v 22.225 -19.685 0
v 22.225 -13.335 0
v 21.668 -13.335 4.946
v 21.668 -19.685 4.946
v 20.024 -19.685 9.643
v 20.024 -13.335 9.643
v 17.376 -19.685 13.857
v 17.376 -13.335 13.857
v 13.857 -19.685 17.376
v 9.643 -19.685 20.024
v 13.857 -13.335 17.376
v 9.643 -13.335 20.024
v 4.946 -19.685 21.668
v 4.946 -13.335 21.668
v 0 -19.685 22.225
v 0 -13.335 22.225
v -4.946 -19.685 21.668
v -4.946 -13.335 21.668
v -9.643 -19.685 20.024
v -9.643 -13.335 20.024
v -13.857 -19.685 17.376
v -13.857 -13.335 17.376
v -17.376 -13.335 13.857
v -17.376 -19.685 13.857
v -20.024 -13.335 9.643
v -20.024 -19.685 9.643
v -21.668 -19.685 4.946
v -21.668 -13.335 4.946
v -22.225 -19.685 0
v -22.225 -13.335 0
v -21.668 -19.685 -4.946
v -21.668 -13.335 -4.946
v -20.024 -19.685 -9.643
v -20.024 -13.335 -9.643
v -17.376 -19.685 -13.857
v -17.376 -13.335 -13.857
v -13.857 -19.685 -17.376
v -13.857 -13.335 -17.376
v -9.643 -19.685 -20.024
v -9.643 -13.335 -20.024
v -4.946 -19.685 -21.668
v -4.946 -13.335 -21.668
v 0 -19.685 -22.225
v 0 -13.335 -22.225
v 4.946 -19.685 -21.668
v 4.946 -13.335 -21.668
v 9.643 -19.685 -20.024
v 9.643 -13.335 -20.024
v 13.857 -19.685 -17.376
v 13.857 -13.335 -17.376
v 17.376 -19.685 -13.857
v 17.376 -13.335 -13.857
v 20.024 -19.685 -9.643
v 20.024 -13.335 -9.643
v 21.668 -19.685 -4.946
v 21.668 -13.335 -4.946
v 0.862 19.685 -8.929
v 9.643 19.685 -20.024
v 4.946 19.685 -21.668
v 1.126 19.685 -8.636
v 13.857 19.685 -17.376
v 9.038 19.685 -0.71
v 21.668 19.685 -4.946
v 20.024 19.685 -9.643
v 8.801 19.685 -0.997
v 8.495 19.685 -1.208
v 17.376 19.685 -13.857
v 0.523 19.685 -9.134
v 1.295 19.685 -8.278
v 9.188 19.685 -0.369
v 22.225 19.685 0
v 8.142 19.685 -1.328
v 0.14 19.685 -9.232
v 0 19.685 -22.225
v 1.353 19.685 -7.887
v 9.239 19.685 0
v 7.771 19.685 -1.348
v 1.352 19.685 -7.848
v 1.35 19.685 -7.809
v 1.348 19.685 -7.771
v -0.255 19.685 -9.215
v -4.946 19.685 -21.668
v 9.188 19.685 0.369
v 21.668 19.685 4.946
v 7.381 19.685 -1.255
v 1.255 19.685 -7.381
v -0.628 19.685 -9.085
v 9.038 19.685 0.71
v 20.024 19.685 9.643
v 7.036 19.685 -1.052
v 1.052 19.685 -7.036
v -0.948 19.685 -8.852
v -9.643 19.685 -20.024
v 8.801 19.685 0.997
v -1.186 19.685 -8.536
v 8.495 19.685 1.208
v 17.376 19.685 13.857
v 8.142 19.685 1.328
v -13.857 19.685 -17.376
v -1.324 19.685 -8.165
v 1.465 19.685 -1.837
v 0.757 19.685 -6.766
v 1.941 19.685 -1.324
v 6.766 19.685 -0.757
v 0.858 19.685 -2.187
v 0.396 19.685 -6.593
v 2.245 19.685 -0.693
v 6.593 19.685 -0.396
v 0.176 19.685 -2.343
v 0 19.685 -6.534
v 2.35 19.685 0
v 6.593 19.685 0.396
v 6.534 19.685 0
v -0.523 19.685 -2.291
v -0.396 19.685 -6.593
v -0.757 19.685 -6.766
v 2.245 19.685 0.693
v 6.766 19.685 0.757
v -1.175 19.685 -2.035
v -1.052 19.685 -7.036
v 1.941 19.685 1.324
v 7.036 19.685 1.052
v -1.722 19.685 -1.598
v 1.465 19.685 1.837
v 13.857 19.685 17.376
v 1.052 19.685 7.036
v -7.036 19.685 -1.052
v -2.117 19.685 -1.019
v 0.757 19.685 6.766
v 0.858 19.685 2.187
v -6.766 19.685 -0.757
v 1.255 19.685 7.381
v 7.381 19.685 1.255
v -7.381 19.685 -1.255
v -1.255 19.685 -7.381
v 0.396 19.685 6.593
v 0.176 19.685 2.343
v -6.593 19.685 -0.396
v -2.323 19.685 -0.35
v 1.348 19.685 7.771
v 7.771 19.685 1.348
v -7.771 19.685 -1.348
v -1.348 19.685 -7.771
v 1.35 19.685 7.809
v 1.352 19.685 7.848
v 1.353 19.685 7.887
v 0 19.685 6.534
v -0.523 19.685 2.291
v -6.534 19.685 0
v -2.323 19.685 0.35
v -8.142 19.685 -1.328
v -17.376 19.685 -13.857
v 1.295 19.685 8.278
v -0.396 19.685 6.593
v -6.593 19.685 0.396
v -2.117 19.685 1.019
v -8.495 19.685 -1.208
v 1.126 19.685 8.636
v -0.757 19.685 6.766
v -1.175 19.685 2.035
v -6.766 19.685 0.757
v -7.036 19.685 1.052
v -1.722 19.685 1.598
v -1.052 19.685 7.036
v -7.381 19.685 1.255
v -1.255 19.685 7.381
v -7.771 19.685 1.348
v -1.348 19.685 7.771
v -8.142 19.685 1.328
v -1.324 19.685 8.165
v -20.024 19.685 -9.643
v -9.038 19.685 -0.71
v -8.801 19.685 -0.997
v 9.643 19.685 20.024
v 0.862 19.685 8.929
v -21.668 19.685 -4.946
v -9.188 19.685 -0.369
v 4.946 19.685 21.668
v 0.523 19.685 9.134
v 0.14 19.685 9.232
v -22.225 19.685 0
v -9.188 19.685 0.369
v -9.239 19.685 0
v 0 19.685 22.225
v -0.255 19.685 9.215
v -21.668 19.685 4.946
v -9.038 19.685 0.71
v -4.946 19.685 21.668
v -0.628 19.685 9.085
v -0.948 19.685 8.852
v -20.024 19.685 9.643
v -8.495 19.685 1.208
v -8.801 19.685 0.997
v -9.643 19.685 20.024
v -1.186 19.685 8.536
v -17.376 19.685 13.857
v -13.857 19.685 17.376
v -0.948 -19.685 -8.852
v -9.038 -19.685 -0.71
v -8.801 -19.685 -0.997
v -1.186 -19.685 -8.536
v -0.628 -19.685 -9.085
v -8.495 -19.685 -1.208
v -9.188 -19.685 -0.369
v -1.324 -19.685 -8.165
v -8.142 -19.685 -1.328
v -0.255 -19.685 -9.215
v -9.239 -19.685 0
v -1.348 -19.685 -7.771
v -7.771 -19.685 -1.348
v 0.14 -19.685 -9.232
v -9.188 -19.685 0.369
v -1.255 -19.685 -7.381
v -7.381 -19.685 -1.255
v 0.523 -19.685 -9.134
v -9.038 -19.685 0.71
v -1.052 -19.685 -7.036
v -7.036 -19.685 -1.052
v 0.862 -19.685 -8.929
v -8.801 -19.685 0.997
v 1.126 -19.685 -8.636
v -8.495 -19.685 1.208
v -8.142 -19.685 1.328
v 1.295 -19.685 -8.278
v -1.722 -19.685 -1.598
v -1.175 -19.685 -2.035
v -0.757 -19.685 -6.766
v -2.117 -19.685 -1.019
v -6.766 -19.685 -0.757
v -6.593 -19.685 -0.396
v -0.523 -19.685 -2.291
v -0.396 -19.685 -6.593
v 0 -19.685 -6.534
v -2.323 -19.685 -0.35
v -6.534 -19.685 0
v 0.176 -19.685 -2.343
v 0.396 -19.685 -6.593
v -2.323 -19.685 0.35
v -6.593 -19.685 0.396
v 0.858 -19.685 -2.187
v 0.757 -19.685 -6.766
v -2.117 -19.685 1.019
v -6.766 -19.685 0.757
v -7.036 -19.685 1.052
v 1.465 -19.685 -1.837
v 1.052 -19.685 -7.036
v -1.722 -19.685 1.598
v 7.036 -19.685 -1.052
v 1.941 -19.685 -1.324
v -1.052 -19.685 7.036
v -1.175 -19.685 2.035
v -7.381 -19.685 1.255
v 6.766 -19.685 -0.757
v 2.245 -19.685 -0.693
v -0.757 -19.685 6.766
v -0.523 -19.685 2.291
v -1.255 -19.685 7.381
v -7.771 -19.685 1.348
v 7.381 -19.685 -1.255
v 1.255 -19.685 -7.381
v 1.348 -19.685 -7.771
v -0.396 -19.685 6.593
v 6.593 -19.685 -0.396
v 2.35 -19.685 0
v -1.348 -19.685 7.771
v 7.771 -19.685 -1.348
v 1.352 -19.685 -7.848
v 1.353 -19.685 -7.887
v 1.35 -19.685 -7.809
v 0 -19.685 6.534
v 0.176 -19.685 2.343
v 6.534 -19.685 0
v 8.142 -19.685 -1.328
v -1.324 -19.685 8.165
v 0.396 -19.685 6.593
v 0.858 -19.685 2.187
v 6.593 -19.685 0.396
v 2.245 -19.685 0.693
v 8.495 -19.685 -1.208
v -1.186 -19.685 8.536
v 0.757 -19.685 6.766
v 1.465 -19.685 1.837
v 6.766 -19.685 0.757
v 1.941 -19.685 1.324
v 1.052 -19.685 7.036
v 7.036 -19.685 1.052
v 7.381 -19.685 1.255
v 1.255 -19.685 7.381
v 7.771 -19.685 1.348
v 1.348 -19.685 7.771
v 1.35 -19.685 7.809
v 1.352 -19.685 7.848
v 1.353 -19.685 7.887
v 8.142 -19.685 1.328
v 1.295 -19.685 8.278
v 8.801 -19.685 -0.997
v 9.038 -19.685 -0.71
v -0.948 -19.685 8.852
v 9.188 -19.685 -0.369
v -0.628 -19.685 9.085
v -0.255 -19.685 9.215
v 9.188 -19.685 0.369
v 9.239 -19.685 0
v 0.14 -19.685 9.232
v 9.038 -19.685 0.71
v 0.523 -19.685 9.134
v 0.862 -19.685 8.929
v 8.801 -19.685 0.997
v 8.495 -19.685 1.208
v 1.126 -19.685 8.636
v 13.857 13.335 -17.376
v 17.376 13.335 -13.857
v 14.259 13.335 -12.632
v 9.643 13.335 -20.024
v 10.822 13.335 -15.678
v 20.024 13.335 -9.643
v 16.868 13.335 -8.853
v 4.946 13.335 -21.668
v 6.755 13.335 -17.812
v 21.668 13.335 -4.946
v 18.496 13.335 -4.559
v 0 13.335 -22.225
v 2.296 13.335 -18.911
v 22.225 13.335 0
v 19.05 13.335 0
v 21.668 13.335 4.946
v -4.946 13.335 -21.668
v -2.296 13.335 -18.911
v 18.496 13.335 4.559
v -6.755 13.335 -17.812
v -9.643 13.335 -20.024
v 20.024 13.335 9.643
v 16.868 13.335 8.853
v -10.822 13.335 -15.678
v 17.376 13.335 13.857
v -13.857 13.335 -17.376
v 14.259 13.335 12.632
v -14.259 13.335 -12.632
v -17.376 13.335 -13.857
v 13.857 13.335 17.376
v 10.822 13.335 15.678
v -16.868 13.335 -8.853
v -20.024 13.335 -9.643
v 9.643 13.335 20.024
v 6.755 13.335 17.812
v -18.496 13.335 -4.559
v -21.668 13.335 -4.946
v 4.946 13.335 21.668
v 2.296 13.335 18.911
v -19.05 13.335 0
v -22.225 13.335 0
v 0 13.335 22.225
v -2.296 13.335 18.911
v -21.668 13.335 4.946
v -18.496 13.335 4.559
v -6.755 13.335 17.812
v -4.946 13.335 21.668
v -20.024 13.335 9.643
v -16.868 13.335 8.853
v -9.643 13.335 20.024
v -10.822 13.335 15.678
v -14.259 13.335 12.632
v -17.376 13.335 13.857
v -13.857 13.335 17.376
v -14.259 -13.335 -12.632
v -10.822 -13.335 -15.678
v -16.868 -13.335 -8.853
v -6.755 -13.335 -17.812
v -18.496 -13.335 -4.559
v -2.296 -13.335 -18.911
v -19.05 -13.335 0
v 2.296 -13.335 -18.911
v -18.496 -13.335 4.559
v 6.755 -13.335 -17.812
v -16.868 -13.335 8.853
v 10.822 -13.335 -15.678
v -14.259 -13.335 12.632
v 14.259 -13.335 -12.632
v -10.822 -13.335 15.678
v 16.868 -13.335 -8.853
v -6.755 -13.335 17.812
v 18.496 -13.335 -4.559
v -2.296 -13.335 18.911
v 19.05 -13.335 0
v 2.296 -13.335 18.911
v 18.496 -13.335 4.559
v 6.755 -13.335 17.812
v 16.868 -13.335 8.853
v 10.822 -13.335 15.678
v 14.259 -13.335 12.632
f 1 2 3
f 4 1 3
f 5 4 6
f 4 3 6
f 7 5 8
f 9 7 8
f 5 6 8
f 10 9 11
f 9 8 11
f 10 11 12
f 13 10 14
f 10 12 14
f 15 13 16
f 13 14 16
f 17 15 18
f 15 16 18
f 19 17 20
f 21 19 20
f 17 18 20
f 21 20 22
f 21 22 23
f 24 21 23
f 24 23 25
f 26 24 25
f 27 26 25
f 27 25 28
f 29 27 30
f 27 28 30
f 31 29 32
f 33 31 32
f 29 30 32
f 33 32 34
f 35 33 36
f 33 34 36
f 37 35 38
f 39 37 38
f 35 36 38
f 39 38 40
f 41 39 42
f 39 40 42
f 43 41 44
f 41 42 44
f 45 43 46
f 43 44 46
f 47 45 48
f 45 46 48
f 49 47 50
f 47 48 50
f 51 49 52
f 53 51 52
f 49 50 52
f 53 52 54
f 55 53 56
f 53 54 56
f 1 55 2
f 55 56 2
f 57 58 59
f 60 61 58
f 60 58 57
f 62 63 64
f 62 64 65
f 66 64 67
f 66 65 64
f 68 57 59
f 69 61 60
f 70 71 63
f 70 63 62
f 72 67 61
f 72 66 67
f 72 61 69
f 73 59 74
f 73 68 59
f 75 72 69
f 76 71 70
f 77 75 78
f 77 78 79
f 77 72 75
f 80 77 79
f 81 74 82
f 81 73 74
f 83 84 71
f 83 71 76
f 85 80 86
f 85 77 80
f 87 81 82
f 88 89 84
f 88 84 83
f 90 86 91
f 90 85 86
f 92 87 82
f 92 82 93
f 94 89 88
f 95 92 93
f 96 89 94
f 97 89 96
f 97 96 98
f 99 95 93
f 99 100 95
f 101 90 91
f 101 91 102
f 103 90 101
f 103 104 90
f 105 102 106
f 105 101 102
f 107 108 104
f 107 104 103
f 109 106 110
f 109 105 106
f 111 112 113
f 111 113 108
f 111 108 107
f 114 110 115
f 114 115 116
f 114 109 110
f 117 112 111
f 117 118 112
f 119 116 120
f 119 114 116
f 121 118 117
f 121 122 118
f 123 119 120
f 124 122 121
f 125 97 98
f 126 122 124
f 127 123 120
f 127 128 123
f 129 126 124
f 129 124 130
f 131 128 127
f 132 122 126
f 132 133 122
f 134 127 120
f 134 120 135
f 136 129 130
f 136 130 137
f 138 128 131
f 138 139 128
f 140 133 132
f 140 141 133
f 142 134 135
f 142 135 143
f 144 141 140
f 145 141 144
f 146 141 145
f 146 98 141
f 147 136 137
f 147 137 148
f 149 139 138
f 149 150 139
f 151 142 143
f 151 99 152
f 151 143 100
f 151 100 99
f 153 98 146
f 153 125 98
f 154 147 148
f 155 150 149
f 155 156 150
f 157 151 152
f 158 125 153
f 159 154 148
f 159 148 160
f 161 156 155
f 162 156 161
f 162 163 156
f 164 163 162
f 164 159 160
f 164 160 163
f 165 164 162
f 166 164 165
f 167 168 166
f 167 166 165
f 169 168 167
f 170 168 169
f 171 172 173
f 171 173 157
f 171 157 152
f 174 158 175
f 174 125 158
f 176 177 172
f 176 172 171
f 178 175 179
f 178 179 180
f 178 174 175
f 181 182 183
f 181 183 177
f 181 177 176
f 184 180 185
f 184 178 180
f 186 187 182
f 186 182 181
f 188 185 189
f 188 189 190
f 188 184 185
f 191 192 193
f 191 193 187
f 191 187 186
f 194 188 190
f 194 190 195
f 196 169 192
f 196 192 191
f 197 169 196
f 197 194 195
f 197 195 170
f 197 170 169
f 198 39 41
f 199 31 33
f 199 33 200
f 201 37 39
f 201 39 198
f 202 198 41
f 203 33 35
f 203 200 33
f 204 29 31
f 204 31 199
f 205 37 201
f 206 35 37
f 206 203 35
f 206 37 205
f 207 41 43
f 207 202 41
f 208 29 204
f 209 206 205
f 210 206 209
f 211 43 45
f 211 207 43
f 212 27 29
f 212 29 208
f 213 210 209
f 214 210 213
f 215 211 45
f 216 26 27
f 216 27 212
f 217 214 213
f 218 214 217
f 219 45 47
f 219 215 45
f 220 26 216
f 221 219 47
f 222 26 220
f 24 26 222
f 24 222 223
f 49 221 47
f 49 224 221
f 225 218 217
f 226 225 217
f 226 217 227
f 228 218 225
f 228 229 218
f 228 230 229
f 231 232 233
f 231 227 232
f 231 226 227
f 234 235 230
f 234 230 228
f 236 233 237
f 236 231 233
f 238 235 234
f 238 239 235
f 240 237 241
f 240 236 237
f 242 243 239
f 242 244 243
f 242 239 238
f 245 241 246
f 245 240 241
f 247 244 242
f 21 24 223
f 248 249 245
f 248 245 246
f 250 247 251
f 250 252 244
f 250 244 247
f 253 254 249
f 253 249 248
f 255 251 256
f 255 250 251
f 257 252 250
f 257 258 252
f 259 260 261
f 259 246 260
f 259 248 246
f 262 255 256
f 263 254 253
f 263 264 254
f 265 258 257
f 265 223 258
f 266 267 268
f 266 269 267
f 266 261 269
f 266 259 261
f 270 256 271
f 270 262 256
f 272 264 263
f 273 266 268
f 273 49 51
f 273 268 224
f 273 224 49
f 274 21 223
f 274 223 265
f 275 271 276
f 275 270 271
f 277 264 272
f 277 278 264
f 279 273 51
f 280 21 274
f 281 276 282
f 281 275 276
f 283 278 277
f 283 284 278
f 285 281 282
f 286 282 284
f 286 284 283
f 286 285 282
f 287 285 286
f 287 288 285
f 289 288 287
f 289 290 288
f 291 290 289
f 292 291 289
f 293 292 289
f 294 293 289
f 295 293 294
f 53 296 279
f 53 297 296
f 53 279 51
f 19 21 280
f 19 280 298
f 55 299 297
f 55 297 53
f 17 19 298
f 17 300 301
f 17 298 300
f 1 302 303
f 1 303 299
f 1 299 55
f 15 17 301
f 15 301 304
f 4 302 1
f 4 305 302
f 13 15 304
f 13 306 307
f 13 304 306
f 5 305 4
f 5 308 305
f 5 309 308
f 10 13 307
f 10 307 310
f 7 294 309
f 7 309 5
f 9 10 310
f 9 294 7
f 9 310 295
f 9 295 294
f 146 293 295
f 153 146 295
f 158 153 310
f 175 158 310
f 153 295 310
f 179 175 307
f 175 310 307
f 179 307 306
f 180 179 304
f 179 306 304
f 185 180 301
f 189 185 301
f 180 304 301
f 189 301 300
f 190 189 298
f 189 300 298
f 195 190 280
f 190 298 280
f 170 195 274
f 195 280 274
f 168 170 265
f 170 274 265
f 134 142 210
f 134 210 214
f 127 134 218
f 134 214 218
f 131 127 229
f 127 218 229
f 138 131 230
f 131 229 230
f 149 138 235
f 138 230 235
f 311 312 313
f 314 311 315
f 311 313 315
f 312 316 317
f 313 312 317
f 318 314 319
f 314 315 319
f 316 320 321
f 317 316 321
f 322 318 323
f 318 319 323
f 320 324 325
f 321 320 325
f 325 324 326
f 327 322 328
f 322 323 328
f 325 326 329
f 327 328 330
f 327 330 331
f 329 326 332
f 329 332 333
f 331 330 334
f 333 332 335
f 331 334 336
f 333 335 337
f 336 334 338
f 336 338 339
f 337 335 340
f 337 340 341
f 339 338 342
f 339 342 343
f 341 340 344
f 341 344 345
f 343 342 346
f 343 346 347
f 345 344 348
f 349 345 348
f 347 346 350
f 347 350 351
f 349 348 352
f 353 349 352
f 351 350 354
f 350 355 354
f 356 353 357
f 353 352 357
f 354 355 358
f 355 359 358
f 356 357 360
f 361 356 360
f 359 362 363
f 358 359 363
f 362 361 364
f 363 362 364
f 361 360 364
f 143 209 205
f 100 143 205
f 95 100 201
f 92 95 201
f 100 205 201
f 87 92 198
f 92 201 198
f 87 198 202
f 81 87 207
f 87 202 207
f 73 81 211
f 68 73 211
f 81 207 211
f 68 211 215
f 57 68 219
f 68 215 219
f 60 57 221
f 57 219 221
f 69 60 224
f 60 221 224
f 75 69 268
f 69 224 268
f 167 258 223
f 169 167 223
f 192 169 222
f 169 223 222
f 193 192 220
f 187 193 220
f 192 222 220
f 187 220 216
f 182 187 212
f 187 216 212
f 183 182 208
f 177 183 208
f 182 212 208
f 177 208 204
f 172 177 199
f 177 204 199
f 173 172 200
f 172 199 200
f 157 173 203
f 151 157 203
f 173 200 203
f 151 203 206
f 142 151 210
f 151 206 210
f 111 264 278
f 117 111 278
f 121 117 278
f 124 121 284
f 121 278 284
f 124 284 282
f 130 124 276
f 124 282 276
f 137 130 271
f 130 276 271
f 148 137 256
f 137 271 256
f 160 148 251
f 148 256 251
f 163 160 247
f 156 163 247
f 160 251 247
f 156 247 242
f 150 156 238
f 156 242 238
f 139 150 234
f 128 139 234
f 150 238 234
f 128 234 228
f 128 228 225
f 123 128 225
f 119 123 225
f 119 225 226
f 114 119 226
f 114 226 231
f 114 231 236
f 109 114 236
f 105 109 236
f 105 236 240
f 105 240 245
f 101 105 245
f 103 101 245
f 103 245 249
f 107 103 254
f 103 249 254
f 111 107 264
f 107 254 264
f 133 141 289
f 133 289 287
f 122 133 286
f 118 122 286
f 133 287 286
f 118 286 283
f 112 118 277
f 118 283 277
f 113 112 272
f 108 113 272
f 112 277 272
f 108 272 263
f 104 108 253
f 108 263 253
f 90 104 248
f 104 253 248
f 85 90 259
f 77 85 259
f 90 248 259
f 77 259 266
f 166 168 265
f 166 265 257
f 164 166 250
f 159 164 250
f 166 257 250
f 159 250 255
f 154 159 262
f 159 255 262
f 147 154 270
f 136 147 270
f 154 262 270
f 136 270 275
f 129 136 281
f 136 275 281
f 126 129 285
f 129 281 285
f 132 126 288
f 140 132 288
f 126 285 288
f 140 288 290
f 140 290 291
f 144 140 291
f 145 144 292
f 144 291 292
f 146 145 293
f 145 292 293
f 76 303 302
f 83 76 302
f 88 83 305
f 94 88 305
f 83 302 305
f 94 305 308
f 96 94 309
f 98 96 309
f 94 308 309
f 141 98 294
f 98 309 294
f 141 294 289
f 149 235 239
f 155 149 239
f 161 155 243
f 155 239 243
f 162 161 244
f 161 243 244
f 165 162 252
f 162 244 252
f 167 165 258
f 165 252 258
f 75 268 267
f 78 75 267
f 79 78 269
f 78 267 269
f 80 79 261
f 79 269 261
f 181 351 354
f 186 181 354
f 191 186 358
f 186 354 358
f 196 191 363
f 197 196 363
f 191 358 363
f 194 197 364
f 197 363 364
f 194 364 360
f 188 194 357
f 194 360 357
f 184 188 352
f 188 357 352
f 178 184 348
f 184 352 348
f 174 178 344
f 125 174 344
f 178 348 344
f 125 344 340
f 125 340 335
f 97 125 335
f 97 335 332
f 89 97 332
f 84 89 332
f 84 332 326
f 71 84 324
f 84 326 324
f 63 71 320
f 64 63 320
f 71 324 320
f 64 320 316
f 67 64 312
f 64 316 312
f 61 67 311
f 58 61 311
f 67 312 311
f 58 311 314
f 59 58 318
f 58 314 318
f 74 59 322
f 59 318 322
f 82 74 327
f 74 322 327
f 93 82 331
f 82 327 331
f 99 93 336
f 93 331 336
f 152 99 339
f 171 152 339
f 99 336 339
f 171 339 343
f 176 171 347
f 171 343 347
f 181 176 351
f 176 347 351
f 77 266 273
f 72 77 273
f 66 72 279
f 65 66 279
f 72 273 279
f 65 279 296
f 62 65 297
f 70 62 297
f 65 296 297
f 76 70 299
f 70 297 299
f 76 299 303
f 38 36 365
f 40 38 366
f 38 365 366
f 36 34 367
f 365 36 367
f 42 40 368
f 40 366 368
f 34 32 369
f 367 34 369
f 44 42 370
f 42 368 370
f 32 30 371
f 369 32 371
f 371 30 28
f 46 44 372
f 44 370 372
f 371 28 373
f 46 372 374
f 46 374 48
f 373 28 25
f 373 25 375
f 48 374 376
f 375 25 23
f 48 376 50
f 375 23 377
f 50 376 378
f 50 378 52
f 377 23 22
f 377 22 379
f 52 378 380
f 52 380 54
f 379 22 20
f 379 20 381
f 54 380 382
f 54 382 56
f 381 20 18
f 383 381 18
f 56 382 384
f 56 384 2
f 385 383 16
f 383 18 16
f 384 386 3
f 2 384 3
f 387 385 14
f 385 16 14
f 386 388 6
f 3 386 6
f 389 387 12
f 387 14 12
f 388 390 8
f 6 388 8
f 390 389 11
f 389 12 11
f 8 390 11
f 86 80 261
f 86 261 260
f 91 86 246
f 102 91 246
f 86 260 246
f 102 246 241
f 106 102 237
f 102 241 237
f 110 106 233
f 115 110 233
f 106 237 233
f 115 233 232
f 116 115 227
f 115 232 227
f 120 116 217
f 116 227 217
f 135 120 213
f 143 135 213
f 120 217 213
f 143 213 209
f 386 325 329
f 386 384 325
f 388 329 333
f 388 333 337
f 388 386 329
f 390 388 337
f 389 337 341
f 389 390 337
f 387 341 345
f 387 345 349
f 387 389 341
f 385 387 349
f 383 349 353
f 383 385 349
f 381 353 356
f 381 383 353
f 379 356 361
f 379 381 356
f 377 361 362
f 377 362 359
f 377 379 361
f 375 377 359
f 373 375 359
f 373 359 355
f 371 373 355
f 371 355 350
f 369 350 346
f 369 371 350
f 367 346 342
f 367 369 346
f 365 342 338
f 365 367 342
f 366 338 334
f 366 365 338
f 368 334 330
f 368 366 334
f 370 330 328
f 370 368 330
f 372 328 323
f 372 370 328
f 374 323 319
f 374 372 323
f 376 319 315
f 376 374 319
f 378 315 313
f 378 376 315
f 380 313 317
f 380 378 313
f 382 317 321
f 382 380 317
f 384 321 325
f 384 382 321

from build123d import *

# Parameters (mm, degrees)
F0_R          = 19.05
F1_DEPTH      = 13.335
F1_DEPTH_BACK = 13.335
F2_R          = 22.225
F3_DEPTH      = 6.35
F4_R          = 22.225
F5_DEPTH      = 6.35
F6_R          = 2.3495
F7_DEPTH      = 39.37


with BuildPart() as f1:
    # F0 (on Front) → F1 (new body, two sides)
    with BuildSketch(Plane.XZ) as f1_sk:
        Circle(F0_R)
    extrude(amount=F1_DEPTH)
    extrude(f1_sk.sketch, amount=-F1_DEPTH_BACK)

    # F2 (on face) → F3 (join)
    with BuildSketch(Plane.XZ.offset(13.335)):
        Circle(F2_R)
    extrude(amount=F3_DEPTH)

    # F4 (on face) → F5 (join)
    with BuildSketch(Plane(origin=(0, 13.335, 0), x_dir=(-1, 0, 0), z_dir=(0, 1, 0))):
        Circle(F4_R)
    extrude(amount=F5_DEPTH)

    # F6 (on face) → F7 (cut)
    with BuildSketch(Plane.XZ.offset(19.685)):
        with BuildLine():
            ThreePointArc((-6.53415, 0), (-6.8901410167, 0.9144734525), (-7.770720471, 1.3475682734))
            ThreePointArc((-7.770720471, 1.3475682734), (-7.8867, 0), (-7.770720471, -1.3475682734))
            ThreePointArc((-7.770720471, -1.3475682734), (-6.8901410167, -0.9144734525), (-6.53415, 0))
        make_face()
        with BuildLine():
            ThreePointArc((-7.770720471, -1.3475682734), (-7.8867, 0), (-7.770720471, 1.3475682734))
            ThreePointArc((-7.770720471, 1.3475682734), (-9.23925, 0), (-7.770720471, -1.3475682734))
        make_face()
        with BuildLine():
            ThreePointArc((7.770720471, -1.3475682734), (7.8576516221, -0.676275), (7.8867, 0))
            ThreePointArc((7.8867, 0), (7.8576516221, 0.676275), (7.770720471, 1.3475682734))
            ThreePointArc((7.770720471, 1.3475682734), (6.53415, 0), (7.770720471, -1.3475682734))
        make_face()
        with BuildLine():
            ThreePointArc((7.770720471, 1.3475682734), (7.8576516221, 0.676275), (7.8867, 0))
            ThreePointArc((7.8867, 0), (7.8576516221, -0.676275), (7.770720471, -1.3475682734))
            ThreePointArc((7.770720471, -1.3475682734), (8.8011734525, -0.9965589833), (9.23925, 0))
            ThreePointArc((9.23925, 0), (8.8011734525, 0.9965589833), (7.770720471, 1.3475682734))
        make_face()
        Circle(F6_R)
        with BuildLine():
            ThreePointArc((-1.3475682734, -7.770720471), (0, -7.8867), (1.3475682734, -7.770720471))
            ThreePointArc((1.3475682734, -7.770720471), (0, -6.53415), (-1.3475682734, -7.770720471))
        make_face()
        with BuildLine():
            ThreePointArc((1.35255, -7.8867), (1.3513039944, -7.8286567645), (1.3475682734, -7.770720471))
            ThreePointArc((1.3475682734, -7.770720471), (0, -7.8867), (-1.3475682734, -7.770720471))
            ThreePointArc((-1.3475682734, -7.770720471), (-0.0580432355, -9.2380039944), (1.35255, -7.8867))
        make_face()
        with BuildLine():
            ThreePointArc((-1.3475682734, 7.770720471), (0, 6.53415), (1.3475682734, 7.770720471))
            ThreePointArc((1.3475682734, 7.770720471), (0, 7.8867), (-1.3475682734, 7.770720471))
        make_face()
        with BuildLine():
            ThreePointArc((-1.3475682734, 7.770720471), (0, 7.8867), (1.3475682734, 7.770720471))
            ThreePointArc((1.3475682734, 7.770720471), (1.3513039944, 7.8286567645), (1.35255, 7.8867))
            ThreePointArc((1.35255, 7.8867), (-0.0580432355, 9.2380039944), (-1.3475682734, 7.770720471))
        make_face()
    extrude(amount=-F7_DEPTH, mode=Mode.SUBTRACT)


solid = f1.part
